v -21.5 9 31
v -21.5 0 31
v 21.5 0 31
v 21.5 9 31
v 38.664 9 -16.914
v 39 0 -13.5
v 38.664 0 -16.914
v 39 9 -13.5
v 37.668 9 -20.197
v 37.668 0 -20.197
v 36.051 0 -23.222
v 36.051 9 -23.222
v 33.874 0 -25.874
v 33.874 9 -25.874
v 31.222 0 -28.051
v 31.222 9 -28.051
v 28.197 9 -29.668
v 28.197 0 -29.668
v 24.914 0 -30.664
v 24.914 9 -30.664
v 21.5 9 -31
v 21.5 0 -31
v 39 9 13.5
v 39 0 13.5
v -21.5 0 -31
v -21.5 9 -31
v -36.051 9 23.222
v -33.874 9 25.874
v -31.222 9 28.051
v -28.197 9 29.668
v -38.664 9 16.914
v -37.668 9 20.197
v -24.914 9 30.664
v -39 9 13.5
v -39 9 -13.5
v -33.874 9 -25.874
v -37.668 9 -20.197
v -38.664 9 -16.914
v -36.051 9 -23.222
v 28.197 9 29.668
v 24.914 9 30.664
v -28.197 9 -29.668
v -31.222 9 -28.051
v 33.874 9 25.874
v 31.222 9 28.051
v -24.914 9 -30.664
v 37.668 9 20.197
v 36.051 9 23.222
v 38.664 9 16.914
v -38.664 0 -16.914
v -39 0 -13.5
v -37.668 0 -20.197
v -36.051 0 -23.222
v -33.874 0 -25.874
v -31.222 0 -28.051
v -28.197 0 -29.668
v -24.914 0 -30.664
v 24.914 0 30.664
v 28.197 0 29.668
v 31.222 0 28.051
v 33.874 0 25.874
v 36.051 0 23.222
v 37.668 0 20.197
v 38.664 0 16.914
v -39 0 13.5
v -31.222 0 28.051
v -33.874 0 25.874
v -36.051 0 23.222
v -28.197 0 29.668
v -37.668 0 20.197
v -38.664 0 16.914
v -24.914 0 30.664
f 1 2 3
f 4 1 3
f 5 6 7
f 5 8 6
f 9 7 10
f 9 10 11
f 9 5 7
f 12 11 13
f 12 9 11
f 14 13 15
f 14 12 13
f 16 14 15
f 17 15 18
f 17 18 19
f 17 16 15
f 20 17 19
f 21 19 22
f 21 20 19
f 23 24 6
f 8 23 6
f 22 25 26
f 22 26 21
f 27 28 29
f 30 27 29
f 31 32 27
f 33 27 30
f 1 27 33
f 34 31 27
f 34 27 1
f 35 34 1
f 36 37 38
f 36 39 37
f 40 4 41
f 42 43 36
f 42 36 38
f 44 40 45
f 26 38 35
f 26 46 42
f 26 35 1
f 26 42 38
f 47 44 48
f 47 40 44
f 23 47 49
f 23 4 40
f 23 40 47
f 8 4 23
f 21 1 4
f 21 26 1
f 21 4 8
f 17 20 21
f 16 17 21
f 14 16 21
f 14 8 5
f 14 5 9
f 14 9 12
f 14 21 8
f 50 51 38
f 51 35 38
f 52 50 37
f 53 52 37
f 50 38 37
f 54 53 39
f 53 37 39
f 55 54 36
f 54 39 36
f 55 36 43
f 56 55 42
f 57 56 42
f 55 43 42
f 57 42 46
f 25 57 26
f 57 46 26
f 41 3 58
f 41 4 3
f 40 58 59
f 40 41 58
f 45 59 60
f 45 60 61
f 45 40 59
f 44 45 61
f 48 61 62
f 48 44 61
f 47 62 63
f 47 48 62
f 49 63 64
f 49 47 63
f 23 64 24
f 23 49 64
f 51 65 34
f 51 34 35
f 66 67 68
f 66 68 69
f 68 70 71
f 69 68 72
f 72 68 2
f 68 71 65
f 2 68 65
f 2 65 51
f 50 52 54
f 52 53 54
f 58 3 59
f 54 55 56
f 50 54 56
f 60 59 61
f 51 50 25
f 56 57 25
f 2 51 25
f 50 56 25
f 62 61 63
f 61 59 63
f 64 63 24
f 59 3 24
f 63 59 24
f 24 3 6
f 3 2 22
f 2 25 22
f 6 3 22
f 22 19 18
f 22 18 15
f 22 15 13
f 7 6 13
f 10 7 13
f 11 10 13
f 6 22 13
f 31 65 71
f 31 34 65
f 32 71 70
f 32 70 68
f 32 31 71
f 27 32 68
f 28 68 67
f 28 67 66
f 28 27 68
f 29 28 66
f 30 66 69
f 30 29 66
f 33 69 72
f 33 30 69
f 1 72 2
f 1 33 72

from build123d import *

# Parameters (mm, degrees)
ESQUISSE1_W        = 78
ESQUISSE1_H        = 62
BOSS_EXTRU_1_DEPTH = 9
CONG_1_R           = 17.5


with BuildPart() as part:
    # Esquisse1 → Boss.-Extru.1 (new body)
    with BuildSketch(Plane(origin=(0, 0, 0), x_dir=(1, 0, 0), z_dir=(0, 1, 0))):
        Rectangle(ESQUISSE1_W, ESQUISSE1_H)
    extrude(amount=BOSS_EXTRU_1_DEPTH)

    # Congé1
    cong_1_edges = [part.edges().sort_by_distance(p)[0] for p in [
        (-39, 4.5, -31),
        (39, 4.5, -31),
        (39, 4.5, 31),
        (-39, 4.5, 31),
    ]]
    fillet(cong_1_edges, radius=CONG_1_R)


solid = part.part
